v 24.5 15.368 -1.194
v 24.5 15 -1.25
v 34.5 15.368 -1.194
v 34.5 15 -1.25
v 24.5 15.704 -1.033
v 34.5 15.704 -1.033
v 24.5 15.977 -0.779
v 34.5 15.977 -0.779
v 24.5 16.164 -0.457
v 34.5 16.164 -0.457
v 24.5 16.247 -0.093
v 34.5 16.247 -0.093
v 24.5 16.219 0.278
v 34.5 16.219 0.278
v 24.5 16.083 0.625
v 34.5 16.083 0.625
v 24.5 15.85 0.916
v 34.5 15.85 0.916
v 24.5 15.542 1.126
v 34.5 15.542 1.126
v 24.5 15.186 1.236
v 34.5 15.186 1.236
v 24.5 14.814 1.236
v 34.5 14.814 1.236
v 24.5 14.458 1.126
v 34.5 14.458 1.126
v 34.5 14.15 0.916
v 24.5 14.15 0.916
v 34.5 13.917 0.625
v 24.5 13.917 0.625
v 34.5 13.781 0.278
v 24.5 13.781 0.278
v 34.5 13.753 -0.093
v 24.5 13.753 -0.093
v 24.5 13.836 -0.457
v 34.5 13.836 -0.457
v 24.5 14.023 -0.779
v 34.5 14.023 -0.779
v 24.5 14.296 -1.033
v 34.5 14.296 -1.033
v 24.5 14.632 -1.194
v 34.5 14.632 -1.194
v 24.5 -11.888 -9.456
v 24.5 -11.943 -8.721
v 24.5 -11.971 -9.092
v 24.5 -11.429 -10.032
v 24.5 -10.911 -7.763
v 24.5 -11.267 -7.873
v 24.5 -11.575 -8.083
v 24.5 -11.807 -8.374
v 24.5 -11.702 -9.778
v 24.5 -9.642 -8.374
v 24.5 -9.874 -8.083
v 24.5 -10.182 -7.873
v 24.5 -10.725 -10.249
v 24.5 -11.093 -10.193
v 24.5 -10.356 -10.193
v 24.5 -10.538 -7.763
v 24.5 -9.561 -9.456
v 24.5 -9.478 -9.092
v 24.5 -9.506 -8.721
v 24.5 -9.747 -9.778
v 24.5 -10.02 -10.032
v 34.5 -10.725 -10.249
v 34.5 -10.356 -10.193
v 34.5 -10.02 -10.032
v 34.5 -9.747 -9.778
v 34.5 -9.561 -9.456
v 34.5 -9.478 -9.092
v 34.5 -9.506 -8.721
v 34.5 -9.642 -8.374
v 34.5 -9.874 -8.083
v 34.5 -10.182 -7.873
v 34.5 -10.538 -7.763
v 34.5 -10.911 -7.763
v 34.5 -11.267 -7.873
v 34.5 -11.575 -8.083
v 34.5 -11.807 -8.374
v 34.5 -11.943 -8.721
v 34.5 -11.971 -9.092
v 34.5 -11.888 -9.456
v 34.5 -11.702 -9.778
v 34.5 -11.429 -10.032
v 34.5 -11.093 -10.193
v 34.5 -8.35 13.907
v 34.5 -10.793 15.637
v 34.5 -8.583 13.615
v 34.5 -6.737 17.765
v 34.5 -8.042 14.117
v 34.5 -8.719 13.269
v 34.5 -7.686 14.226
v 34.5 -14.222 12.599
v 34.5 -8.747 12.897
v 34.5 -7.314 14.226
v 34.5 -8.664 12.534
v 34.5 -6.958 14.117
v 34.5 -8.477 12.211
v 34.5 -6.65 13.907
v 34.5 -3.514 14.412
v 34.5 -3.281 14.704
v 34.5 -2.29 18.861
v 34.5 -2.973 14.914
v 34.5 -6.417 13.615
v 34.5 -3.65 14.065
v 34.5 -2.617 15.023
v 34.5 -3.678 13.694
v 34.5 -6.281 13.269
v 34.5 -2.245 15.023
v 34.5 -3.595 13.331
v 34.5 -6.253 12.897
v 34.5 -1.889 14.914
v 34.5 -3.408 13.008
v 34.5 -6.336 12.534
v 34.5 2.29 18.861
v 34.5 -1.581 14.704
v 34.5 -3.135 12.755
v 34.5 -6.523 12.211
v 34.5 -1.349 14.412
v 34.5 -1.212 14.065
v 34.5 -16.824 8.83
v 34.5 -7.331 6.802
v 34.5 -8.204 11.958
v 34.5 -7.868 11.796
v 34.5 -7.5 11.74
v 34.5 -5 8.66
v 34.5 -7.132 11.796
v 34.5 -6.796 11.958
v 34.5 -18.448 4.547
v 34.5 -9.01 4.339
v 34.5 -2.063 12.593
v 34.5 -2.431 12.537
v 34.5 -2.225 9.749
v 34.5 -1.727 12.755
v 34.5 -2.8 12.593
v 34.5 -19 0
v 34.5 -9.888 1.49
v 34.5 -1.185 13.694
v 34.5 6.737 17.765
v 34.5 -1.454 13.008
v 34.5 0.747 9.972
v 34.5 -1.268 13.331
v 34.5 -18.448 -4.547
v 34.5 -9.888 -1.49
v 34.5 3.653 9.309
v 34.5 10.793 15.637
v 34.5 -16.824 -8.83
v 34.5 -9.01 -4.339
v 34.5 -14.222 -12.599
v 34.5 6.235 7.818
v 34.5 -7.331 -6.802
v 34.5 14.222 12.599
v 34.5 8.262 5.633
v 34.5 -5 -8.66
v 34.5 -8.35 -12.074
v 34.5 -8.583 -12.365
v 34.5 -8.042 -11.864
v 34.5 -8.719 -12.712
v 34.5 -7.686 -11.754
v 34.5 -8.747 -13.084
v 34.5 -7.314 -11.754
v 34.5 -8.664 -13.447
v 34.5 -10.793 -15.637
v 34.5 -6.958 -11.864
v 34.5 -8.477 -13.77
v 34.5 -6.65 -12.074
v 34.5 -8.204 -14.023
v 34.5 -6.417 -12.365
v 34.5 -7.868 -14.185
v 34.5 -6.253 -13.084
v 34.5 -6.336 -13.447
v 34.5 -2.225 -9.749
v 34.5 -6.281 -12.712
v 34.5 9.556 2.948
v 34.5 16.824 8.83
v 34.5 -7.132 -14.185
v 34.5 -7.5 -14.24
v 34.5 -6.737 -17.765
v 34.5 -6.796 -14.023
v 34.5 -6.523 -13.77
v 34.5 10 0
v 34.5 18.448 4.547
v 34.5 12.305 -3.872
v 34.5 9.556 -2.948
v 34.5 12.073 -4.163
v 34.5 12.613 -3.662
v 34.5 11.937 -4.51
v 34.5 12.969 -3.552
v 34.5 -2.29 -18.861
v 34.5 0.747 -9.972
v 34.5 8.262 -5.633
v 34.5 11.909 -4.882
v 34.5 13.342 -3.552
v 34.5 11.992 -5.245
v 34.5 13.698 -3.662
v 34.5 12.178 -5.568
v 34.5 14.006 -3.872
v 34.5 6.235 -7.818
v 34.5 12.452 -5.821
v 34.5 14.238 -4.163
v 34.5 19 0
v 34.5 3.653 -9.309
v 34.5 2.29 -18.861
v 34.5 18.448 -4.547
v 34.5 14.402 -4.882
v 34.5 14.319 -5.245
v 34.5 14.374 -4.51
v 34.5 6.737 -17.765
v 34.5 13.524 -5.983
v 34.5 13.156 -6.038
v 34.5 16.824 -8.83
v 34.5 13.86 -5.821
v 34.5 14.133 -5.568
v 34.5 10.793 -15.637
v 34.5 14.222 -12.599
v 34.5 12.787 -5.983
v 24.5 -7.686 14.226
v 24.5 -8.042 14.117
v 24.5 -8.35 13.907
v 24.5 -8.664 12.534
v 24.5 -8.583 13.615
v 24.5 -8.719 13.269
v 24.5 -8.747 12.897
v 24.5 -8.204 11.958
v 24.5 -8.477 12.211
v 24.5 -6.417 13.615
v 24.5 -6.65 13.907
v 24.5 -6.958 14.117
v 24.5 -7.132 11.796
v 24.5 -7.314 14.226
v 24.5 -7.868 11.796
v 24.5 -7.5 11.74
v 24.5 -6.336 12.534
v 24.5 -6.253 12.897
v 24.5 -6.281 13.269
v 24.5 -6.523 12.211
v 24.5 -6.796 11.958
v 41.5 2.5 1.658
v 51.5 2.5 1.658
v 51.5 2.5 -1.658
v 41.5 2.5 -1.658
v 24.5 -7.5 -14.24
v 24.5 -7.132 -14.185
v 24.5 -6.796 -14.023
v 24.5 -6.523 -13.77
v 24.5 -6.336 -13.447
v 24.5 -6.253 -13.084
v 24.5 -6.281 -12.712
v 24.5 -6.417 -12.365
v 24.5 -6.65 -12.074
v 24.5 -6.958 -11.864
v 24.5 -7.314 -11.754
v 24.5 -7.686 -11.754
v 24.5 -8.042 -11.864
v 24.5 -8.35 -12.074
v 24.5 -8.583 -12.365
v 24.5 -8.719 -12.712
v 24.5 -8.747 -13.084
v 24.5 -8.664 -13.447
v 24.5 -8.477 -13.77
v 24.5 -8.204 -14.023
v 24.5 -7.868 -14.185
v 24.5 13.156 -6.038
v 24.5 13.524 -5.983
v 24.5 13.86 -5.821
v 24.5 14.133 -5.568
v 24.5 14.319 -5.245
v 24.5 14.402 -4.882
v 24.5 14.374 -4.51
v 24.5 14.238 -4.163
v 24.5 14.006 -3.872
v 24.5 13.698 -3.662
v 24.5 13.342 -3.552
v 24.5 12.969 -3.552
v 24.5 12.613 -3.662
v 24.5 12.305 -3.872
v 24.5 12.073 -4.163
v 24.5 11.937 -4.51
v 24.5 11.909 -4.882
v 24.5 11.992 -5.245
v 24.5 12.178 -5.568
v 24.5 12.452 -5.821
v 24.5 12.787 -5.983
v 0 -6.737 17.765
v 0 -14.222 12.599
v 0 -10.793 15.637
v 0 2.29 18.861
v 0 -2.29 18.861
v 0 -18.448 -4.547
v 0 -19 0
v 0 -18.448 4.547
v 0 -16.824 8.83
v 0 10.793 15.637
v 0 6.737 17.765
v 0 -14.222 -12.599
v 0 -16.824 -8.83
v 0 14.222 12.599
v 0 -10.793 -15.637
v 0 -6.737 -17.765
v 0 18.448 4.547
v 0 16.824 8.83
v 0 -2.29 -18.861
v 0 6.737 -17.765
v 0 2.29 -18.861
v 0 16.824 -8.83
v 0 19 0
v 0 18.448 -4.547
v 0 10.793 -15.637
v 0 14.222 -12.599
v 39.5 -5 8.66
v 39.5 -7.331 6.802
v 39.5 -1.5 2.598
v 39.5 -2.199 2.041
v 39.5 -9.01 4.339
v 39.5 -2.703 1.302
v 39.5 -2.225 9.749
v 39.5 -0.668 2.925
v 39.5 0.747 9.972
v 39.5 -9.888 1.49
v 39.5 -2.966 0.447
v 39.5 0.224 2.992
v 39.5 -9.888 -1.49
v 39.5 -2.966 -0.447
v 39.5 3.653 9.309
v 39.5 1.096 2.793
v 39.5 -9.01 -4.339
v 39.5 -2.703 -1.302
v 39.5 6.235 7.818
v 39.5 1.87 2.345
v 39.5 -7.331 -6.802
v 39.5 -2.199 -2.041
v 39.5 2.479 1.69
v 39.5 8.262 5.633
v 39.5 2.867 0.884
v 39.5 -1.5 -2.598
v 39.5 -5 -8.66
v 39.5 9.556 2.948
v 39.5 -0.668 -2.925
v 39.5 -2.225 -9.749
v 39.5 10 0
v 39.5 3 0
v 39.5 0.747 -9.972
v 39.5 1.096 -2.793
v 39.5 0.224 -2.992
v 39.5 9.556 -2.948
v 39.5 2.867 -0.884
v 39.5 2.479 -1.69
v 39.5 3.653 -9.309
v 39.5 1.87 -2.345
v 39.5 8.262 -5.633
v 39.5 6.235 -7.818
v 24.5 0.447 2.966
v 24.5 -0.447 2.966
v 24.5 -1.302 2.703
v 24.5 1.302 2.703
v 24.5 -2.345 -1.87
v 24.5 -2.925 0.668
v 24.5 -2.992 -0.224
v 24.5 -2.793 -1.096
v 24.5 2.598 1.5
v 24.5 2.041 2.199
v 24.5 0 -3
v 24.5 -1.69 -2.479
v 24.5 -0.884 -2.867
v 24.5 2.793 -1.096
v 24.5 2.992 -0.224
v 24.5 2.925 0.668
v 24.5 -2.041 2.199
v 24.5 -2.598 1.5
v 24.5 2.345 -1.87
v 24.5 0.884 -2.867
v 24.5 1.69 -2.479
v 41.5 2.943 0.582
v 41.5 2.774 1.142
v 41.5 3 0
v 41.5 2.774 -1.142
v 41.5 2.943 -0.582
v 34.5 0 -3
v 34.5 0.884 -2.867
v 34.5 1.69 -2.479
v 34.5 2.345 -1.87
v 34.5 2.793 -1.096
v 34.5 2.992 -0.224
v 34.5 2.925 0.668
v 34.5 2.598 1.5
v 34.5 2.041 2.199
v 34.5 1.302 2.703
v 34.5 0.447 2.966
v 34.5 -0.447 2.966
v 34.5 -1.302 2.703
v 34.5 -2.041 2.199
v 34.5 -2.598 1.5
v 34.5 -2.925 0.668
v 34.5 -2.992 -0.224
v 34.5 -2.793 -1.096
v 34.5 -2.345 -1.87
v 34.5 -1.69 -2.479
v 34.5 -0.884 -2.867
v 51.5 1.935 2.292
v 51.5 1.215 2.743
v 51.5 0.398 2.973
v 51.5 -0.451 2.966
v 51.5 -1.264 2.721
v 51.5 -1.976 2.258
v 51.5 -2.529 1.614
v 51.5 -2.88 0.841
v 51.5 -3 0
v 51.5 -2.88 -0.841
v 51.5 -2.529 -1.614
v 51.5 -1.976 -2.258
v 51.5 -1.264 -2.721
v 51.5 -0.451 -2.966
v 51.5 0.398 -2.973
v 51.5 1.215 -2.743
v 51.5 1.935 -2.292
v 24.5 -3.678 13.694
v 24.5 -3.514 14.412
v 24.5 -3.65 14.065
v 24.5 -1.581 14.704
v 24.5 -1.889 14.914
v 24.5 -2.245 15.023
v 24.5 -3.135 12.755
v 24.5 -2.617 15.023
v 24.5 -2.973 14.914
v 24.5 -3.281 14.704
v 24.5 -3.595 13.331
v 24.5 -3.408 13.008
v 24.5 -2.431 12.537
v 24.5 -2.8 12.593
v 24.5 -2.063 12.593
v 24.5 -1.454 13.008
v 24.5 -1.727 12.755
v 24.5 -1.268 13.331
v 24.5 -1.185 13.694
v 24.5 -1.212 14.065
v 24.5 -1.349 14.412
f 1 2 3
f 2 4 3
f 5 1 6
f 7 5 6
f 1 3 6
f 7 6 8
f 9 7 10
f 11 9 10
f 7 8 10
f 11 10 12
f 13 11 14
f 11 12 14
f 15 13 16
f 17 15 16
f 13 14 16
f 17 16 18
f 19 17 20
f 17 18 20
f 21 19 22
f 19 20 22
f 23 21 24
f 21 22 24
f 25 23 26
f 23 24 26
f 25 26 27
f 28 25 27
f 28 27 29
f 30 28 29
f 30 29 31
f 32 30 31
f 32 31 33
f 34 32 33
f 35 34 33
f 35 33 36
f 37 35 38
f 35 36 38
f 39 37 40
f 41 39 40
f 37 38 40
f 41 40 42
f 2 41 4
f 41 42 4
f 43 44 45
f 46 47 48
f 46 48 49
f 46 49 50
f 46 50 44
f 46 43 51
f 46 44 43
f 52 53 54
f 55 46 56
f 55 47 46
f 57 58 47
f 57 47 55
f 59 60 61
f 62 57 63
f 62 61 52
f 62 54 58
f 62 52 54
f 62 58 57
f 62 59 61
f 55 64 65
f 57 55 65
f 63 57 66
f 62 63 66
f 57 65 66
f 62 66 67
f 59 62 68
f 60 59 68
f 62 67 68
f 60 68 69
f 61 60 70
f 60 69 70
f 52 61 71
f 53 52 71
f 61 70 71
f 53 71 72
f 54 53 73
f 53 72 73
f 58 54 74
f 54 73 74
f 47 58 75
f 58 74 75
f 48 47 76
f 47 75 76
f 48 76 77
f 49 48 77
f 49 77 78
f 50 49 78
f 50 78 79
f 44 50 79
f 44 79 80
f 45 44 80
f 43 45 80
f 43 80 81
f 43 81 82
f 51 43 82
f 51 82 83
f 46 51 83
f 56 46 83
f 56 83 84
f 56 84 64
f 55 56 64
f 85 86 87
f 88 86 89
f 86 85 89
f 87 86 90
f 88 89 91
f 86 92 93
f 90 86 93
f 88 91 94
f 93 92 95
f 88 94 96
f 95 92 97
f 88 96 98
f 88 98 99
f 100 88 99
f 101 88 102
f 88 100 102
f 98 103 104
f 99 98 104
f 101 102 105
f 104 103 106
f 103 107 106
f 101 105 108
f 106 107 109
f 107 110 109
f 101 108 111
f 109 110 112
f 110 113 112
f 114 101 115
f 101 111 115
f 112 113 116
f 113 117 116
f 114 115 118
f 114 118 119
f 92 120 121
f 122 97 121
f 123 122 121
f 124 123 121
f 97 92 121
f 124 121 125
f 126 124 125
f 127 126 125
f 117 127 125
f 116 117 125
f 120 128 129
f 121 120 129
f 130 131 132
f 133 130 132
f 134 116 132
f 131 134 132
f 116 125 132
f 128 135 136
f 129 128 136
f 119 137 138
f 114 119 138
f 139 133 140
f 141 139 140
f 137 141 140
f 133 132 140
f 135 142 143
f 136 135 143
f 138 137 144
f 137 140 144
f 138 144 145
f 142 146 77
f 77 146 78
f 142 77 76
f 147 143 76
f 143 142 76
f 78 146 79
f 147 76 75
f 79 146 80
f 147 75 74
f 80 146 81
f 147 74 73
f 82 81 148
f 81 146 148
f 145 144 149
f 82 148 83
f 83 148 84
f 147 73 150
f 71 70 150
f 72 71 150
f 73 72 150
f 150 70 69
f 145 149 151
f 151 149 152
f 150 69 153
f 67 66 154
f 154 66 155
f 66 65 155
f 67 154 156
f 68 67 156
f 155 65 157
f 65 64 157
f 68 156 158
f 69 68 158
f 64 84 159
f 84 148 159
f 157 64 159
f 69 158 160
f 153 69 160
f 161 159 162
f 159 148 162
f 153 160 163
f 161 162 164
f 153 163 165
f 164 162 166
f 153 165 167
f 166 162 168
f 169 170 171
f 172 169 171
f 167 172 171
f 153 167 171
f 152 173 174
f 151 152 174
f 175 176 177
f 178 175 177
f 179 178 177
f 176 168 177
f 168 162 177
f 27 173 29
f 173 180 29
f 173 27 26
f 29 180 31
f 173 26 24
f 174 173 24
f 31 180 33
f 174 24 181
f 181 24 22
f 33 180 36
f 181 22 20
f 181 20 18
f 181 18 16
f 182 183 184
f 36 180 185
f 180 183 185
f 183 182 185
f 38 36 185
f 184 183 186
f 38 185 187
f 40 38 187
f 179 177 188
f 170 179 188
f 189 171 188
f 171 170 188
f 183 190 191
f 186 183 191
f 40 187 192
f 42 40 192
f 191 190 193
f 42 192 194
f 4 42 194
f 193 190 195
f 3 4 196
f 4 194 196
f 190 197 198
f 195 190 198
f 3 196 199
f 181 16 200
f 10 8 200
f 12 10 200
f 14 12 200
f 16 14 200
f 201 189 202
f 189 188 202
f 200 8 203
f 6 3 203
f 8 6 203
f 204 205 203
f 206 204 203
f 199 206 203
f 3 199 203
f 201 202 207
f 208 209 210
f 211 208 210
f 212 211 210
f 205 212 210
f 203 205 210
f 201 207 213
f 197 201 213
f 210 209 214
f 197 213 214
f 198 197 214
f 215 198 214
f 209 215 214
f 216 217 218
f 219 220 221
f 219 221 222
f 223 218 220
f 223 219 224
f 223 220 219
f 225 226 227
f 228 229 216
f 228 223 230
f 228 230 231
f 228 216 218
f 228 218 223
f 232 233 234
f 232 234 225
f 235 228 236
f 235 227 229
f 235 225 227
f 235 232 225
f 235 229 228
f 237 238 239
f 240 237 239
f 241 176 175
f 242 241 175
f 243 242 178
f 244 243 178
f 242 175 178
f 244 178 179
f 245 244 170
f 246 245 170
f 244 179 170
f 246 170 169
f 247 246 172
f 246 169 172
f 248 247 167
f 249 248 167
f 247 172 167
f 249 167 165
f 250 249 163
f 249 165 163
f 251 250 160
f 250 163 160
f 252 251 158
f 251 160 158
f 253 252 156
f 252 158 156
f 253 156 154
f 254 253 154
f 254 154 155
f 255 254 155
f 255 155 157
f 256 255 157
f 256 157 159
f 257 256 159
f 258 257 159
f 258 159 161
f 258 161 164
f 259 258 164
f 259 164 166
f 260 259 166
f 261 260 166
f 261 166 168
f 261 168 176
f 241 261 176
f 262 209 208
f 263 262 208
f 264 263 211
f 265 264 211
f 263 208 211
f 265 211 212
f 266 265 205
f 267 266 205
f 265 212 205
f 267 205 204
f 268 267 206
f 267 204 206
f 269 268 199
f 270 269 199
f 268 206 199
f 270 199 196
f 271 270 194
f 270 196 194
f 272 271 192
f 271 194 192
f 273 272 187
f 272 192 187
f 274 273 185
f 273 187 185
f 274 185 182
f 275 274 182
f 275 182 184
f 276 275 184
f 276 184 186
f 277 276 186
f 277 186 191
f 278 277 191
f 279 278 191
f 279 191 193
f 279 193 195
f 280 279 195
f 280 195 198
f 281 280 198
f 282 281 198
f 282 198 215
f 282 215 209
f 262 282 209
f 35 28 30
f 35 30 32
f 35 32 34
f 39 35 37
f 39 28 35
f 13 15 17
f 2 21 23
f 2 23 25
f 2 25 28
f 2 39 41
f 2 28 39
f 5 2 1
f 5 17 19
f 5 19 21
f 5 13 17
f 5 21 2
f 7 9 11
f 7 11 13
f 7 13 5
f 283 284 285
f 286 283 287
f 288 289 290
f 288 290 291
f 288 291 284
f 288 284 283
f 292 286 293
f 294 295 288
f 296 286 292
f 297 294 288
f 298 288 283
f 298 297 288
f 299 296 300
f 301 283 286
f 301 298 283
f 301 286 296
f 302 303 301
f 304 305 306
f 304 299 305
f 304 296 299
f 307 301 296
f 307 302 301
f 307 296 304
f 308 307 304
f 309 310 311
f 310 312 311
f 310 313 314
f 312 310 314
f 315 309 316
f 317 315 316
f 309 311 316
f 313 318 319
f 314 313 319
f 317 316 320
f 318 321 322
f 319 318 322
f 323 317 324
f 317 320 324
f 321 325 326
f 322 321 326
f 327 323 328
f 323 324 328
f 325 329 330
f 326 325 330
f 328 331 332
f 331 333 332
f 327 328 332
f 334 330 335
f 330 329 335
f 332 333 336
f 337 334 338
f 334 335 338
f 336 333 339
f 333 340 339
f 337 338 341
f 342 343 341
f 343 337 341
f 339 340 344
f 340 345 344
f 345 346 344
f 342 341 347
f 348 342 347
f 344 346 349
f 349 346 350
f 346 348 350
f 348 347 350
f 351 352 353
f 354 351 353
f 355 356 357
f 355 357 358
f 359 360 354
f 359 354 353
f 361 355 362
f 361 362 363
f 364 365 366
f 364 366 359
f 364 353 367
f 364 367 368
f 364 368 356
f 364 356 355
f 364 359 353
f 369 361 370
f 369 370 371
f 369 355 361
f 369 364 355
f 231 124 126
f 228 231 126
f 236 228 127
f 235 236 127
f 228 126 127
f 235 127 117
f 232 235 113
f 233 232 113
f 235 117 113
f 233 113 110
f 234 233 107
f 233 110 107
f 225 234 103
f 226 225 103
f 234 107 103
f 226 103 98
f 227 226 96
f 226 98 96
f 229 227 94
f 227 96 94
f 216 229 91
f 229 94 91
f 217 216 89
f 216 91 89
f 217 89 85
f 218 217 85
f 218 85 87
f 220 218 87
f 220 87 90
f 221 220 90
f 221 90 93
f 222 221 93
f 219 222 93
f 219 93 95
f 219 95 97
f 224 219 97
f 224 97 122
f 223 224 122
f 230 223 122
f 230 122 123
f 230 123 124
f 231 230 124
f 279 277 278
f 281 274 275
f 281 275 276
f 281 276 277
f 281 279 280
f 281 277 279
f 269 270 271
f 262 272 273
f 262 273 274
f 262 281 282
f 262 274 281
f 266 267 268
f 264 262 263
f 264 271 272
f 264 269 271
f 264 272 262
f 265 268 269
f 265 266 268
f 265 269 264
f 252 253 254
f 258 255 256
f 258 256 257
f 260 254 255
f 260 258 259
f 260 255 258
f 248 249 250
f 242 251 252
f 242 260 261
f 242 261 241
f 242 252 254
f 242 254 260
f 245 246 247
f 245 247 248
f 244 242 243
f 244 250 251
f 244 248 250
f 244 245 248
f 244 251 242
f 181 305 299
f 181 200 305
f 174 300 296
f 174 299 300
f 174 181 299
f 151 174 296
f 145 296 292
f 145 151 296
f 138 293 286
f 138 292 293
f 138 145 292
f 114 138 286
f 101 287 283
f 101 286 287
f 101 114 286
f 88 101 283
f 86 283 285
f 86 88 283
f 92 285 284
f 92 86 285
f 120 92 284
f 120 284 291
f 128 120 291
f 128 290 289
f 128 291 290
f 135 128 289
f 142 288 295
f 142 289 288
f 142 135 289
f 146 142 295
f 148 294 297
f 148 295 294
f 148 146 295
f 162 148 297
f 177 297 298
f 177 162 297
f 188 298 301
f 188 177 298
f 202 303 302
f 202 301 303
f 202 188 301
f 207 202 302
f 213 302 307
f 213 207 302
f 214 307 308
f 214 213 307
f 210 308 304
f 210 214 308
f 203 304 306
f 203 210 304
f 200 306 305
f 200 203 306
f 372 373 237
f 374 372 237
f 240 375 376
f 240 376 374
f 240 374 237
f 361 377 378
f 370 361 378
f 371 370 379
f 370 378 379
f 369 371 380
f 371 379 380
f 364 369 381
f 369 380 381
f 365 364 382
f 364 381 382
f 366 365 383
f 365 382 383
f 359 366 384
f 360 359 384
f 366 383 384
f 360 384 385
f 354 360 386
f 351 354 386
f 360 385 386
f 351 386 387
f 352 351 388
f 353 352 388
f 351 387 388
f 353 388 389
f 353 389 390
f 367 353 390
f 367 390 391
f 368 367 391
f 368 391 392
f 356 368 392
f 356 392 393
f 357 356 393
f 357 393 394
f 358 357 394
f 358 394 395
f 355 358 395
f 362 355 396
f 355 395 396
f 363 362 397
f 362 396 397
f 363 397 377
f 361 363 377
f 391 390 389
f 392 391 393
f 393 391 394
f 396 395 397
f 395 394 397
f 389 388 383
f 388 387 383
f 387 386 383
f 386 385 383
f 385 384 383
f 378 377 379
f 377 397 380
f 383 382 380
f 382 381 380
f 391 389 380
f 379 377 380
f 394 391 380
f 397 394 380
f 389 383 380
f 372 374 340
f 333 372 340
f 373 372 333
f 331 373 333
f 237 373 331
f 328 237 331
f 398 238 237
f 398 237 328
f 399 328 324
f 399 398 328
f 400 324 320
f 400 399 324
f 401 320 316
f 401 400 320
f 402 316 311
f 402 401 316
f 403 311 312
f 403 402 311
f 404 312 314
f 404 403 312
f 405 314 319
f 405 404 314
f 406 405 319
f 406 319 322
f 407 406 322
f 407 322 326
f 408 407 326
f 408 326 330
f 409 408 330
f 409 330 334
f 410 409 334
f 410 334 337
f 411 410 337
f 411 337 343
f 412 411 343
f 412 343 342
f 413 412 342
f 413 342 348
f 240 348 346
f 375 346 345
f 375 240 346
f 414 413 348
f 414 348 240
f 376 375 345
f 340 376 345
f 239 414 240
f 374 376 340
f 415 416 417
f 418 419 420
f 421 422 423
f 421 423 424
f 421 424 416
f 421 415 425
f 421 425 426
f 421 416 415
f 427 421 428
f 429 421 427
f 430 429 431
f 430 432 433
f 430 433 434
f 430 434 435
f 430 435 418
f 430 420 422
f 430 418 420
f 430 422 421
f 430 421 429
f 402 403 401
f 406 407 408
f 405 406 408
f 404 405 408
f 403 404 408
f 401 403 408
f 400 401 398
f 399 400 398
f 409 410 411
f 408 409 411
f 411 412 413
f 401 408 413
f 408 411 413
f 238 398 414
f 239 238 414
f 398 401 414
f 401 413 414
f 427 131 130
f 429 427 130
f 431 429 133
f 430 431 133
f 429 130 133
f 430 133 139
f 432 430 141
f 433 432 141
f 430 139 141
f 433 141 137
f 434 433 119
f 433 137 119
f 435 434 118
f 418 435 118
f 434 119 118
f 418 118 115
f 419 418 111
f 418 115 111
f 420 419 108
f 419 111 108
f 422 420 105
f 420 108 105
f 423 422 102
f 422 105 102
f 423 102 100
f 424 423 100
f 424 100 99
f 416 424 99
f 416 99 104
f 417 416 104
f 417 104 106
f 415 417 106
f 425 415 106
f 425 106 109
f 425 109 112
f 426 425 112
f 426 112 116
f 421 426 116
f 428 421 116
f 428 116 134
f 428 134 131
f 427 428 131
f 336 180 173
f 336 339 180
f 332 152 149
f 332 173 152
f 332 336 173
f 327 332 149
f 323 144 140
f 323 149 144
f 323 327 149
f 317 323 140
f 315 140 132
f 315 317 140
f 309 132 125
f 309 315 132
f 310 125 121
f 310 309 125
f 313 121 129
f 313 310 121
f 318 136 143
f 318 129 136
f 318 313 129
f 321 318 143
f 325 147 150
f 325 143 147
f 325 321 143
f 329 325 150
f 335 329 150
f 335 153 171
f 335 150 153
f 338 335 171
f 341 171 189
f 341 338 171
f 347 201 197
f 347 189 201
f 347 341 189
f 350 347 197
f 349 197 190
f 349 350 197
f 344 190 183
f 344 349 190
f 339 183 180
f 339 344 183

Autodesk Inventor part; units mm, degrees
ref_plane "YZ Plane" through (0, 0, 0) normal (1, 0, 0) x (0, 1, 0)
ref_plane "XZ Plane" through (0, 0, 0) normal (0, 1, 0) x (-1, 0, 0)
ref_plane "XY Plane" through (0, 0, 0) normal (0, 0, 1) x (1, 0, 0)
sketch "Sketch1" plane through (0, 0, 0) normal (0, 0, 1) x (1, 0, 0)
  line L0 (0, 0) -> (0, 19)
  line L1 (0, 19) -> (34.5, 19)
  line L2 (34.5, 19) -> (34.5, 10)
  line L3 (34.5, 10) -> (39.5, 10)
  line L4 (39.5, 10) -> (39.5, 3)
  line L5 (39.5, 3) -> (51.5, 3)
  line L6 (51.5, 3) -> (51.5, 0)
  line L7 (51.5, 0) -> (0, 0)
  dimension "d0" = 19
  dimension "d1" = 34.5
  dimension "d2" = 5
  dimension "d3" = 10
  dimension "d4" = 12
  dimension "d5" = 3
revolve "Revolution1" add sketch "Sketch1" angle 360 about axis through (51.5, 0, 0) along (-1, 0, 0)
sketch "Sketch2" plane through (51.5, 0, 0) normal (1, 0, 0) x (0, 0, -1)
  circle A0 centre (0, 0) radius 3 projected
  circle A1 centre (0, 0) radius 3 projected
  line L0 (-1.6583, 2.5) -> (1.6583, 2.5)
  point P0 (0, 0)
  point P1 (-1.6583, 2.5)
  point P2 (1.6583, 2.5)
  dimension "d7" = 2.5
extrude "Extrusion1" cut sketch "Sketch2" against normal blind 10 contours L0 A0 picked at (-0.1169, 2.6598)
sketch "Sketch3" plane through (34.5, 0, 0) normal (1, 0, 0) x (0, 0, -1)
  circle A0 centre (0, 15) radius 1.25
  circle A1 centre (4.7883, 13.1557) radius 1.25
  circle A2 centre (0, 0) radius 3 projected
  circle A3 centre (0, 0) radius 14 construction
  circle A4 centre (0, 0) radius 15 construction
  circle A5 centre (0, 0) radius 19 projected
  line L0 (0, 0) -> (0, 15) construction
  line L1 (1.6583, 2.5) -> (-1.6583, 2.5) projected
  line L2 (0, 0) -> (4.7883, 13.1557) construction
  circle A6 centre (-13.7873, -2.4311) radius 1.25
  circle A7 centre (-12.9904, -7.5) radius 1.25
  circle A8 centre (8.999, -10.7246) radius 1.25
  circle A9 centre (12.9904, -7.5) radius 1.25
  dimension "d21" = 28
  dimension "d22" = 30
  dimension "d10" = 4
  dimension "d11" = 5
  dimension "d12" = 2.5
  dimension "d13" = 2.5
  dimension "d14" = 20
  dimension "d17" = 360
extrude "Extrusion2" cut sketch "Sketch3" against normal blind 10 contours A0 | A1 | A2 L1 | L1 A2 | A6 | A7 | A8 | A9
properties part number "TestEncoder"
